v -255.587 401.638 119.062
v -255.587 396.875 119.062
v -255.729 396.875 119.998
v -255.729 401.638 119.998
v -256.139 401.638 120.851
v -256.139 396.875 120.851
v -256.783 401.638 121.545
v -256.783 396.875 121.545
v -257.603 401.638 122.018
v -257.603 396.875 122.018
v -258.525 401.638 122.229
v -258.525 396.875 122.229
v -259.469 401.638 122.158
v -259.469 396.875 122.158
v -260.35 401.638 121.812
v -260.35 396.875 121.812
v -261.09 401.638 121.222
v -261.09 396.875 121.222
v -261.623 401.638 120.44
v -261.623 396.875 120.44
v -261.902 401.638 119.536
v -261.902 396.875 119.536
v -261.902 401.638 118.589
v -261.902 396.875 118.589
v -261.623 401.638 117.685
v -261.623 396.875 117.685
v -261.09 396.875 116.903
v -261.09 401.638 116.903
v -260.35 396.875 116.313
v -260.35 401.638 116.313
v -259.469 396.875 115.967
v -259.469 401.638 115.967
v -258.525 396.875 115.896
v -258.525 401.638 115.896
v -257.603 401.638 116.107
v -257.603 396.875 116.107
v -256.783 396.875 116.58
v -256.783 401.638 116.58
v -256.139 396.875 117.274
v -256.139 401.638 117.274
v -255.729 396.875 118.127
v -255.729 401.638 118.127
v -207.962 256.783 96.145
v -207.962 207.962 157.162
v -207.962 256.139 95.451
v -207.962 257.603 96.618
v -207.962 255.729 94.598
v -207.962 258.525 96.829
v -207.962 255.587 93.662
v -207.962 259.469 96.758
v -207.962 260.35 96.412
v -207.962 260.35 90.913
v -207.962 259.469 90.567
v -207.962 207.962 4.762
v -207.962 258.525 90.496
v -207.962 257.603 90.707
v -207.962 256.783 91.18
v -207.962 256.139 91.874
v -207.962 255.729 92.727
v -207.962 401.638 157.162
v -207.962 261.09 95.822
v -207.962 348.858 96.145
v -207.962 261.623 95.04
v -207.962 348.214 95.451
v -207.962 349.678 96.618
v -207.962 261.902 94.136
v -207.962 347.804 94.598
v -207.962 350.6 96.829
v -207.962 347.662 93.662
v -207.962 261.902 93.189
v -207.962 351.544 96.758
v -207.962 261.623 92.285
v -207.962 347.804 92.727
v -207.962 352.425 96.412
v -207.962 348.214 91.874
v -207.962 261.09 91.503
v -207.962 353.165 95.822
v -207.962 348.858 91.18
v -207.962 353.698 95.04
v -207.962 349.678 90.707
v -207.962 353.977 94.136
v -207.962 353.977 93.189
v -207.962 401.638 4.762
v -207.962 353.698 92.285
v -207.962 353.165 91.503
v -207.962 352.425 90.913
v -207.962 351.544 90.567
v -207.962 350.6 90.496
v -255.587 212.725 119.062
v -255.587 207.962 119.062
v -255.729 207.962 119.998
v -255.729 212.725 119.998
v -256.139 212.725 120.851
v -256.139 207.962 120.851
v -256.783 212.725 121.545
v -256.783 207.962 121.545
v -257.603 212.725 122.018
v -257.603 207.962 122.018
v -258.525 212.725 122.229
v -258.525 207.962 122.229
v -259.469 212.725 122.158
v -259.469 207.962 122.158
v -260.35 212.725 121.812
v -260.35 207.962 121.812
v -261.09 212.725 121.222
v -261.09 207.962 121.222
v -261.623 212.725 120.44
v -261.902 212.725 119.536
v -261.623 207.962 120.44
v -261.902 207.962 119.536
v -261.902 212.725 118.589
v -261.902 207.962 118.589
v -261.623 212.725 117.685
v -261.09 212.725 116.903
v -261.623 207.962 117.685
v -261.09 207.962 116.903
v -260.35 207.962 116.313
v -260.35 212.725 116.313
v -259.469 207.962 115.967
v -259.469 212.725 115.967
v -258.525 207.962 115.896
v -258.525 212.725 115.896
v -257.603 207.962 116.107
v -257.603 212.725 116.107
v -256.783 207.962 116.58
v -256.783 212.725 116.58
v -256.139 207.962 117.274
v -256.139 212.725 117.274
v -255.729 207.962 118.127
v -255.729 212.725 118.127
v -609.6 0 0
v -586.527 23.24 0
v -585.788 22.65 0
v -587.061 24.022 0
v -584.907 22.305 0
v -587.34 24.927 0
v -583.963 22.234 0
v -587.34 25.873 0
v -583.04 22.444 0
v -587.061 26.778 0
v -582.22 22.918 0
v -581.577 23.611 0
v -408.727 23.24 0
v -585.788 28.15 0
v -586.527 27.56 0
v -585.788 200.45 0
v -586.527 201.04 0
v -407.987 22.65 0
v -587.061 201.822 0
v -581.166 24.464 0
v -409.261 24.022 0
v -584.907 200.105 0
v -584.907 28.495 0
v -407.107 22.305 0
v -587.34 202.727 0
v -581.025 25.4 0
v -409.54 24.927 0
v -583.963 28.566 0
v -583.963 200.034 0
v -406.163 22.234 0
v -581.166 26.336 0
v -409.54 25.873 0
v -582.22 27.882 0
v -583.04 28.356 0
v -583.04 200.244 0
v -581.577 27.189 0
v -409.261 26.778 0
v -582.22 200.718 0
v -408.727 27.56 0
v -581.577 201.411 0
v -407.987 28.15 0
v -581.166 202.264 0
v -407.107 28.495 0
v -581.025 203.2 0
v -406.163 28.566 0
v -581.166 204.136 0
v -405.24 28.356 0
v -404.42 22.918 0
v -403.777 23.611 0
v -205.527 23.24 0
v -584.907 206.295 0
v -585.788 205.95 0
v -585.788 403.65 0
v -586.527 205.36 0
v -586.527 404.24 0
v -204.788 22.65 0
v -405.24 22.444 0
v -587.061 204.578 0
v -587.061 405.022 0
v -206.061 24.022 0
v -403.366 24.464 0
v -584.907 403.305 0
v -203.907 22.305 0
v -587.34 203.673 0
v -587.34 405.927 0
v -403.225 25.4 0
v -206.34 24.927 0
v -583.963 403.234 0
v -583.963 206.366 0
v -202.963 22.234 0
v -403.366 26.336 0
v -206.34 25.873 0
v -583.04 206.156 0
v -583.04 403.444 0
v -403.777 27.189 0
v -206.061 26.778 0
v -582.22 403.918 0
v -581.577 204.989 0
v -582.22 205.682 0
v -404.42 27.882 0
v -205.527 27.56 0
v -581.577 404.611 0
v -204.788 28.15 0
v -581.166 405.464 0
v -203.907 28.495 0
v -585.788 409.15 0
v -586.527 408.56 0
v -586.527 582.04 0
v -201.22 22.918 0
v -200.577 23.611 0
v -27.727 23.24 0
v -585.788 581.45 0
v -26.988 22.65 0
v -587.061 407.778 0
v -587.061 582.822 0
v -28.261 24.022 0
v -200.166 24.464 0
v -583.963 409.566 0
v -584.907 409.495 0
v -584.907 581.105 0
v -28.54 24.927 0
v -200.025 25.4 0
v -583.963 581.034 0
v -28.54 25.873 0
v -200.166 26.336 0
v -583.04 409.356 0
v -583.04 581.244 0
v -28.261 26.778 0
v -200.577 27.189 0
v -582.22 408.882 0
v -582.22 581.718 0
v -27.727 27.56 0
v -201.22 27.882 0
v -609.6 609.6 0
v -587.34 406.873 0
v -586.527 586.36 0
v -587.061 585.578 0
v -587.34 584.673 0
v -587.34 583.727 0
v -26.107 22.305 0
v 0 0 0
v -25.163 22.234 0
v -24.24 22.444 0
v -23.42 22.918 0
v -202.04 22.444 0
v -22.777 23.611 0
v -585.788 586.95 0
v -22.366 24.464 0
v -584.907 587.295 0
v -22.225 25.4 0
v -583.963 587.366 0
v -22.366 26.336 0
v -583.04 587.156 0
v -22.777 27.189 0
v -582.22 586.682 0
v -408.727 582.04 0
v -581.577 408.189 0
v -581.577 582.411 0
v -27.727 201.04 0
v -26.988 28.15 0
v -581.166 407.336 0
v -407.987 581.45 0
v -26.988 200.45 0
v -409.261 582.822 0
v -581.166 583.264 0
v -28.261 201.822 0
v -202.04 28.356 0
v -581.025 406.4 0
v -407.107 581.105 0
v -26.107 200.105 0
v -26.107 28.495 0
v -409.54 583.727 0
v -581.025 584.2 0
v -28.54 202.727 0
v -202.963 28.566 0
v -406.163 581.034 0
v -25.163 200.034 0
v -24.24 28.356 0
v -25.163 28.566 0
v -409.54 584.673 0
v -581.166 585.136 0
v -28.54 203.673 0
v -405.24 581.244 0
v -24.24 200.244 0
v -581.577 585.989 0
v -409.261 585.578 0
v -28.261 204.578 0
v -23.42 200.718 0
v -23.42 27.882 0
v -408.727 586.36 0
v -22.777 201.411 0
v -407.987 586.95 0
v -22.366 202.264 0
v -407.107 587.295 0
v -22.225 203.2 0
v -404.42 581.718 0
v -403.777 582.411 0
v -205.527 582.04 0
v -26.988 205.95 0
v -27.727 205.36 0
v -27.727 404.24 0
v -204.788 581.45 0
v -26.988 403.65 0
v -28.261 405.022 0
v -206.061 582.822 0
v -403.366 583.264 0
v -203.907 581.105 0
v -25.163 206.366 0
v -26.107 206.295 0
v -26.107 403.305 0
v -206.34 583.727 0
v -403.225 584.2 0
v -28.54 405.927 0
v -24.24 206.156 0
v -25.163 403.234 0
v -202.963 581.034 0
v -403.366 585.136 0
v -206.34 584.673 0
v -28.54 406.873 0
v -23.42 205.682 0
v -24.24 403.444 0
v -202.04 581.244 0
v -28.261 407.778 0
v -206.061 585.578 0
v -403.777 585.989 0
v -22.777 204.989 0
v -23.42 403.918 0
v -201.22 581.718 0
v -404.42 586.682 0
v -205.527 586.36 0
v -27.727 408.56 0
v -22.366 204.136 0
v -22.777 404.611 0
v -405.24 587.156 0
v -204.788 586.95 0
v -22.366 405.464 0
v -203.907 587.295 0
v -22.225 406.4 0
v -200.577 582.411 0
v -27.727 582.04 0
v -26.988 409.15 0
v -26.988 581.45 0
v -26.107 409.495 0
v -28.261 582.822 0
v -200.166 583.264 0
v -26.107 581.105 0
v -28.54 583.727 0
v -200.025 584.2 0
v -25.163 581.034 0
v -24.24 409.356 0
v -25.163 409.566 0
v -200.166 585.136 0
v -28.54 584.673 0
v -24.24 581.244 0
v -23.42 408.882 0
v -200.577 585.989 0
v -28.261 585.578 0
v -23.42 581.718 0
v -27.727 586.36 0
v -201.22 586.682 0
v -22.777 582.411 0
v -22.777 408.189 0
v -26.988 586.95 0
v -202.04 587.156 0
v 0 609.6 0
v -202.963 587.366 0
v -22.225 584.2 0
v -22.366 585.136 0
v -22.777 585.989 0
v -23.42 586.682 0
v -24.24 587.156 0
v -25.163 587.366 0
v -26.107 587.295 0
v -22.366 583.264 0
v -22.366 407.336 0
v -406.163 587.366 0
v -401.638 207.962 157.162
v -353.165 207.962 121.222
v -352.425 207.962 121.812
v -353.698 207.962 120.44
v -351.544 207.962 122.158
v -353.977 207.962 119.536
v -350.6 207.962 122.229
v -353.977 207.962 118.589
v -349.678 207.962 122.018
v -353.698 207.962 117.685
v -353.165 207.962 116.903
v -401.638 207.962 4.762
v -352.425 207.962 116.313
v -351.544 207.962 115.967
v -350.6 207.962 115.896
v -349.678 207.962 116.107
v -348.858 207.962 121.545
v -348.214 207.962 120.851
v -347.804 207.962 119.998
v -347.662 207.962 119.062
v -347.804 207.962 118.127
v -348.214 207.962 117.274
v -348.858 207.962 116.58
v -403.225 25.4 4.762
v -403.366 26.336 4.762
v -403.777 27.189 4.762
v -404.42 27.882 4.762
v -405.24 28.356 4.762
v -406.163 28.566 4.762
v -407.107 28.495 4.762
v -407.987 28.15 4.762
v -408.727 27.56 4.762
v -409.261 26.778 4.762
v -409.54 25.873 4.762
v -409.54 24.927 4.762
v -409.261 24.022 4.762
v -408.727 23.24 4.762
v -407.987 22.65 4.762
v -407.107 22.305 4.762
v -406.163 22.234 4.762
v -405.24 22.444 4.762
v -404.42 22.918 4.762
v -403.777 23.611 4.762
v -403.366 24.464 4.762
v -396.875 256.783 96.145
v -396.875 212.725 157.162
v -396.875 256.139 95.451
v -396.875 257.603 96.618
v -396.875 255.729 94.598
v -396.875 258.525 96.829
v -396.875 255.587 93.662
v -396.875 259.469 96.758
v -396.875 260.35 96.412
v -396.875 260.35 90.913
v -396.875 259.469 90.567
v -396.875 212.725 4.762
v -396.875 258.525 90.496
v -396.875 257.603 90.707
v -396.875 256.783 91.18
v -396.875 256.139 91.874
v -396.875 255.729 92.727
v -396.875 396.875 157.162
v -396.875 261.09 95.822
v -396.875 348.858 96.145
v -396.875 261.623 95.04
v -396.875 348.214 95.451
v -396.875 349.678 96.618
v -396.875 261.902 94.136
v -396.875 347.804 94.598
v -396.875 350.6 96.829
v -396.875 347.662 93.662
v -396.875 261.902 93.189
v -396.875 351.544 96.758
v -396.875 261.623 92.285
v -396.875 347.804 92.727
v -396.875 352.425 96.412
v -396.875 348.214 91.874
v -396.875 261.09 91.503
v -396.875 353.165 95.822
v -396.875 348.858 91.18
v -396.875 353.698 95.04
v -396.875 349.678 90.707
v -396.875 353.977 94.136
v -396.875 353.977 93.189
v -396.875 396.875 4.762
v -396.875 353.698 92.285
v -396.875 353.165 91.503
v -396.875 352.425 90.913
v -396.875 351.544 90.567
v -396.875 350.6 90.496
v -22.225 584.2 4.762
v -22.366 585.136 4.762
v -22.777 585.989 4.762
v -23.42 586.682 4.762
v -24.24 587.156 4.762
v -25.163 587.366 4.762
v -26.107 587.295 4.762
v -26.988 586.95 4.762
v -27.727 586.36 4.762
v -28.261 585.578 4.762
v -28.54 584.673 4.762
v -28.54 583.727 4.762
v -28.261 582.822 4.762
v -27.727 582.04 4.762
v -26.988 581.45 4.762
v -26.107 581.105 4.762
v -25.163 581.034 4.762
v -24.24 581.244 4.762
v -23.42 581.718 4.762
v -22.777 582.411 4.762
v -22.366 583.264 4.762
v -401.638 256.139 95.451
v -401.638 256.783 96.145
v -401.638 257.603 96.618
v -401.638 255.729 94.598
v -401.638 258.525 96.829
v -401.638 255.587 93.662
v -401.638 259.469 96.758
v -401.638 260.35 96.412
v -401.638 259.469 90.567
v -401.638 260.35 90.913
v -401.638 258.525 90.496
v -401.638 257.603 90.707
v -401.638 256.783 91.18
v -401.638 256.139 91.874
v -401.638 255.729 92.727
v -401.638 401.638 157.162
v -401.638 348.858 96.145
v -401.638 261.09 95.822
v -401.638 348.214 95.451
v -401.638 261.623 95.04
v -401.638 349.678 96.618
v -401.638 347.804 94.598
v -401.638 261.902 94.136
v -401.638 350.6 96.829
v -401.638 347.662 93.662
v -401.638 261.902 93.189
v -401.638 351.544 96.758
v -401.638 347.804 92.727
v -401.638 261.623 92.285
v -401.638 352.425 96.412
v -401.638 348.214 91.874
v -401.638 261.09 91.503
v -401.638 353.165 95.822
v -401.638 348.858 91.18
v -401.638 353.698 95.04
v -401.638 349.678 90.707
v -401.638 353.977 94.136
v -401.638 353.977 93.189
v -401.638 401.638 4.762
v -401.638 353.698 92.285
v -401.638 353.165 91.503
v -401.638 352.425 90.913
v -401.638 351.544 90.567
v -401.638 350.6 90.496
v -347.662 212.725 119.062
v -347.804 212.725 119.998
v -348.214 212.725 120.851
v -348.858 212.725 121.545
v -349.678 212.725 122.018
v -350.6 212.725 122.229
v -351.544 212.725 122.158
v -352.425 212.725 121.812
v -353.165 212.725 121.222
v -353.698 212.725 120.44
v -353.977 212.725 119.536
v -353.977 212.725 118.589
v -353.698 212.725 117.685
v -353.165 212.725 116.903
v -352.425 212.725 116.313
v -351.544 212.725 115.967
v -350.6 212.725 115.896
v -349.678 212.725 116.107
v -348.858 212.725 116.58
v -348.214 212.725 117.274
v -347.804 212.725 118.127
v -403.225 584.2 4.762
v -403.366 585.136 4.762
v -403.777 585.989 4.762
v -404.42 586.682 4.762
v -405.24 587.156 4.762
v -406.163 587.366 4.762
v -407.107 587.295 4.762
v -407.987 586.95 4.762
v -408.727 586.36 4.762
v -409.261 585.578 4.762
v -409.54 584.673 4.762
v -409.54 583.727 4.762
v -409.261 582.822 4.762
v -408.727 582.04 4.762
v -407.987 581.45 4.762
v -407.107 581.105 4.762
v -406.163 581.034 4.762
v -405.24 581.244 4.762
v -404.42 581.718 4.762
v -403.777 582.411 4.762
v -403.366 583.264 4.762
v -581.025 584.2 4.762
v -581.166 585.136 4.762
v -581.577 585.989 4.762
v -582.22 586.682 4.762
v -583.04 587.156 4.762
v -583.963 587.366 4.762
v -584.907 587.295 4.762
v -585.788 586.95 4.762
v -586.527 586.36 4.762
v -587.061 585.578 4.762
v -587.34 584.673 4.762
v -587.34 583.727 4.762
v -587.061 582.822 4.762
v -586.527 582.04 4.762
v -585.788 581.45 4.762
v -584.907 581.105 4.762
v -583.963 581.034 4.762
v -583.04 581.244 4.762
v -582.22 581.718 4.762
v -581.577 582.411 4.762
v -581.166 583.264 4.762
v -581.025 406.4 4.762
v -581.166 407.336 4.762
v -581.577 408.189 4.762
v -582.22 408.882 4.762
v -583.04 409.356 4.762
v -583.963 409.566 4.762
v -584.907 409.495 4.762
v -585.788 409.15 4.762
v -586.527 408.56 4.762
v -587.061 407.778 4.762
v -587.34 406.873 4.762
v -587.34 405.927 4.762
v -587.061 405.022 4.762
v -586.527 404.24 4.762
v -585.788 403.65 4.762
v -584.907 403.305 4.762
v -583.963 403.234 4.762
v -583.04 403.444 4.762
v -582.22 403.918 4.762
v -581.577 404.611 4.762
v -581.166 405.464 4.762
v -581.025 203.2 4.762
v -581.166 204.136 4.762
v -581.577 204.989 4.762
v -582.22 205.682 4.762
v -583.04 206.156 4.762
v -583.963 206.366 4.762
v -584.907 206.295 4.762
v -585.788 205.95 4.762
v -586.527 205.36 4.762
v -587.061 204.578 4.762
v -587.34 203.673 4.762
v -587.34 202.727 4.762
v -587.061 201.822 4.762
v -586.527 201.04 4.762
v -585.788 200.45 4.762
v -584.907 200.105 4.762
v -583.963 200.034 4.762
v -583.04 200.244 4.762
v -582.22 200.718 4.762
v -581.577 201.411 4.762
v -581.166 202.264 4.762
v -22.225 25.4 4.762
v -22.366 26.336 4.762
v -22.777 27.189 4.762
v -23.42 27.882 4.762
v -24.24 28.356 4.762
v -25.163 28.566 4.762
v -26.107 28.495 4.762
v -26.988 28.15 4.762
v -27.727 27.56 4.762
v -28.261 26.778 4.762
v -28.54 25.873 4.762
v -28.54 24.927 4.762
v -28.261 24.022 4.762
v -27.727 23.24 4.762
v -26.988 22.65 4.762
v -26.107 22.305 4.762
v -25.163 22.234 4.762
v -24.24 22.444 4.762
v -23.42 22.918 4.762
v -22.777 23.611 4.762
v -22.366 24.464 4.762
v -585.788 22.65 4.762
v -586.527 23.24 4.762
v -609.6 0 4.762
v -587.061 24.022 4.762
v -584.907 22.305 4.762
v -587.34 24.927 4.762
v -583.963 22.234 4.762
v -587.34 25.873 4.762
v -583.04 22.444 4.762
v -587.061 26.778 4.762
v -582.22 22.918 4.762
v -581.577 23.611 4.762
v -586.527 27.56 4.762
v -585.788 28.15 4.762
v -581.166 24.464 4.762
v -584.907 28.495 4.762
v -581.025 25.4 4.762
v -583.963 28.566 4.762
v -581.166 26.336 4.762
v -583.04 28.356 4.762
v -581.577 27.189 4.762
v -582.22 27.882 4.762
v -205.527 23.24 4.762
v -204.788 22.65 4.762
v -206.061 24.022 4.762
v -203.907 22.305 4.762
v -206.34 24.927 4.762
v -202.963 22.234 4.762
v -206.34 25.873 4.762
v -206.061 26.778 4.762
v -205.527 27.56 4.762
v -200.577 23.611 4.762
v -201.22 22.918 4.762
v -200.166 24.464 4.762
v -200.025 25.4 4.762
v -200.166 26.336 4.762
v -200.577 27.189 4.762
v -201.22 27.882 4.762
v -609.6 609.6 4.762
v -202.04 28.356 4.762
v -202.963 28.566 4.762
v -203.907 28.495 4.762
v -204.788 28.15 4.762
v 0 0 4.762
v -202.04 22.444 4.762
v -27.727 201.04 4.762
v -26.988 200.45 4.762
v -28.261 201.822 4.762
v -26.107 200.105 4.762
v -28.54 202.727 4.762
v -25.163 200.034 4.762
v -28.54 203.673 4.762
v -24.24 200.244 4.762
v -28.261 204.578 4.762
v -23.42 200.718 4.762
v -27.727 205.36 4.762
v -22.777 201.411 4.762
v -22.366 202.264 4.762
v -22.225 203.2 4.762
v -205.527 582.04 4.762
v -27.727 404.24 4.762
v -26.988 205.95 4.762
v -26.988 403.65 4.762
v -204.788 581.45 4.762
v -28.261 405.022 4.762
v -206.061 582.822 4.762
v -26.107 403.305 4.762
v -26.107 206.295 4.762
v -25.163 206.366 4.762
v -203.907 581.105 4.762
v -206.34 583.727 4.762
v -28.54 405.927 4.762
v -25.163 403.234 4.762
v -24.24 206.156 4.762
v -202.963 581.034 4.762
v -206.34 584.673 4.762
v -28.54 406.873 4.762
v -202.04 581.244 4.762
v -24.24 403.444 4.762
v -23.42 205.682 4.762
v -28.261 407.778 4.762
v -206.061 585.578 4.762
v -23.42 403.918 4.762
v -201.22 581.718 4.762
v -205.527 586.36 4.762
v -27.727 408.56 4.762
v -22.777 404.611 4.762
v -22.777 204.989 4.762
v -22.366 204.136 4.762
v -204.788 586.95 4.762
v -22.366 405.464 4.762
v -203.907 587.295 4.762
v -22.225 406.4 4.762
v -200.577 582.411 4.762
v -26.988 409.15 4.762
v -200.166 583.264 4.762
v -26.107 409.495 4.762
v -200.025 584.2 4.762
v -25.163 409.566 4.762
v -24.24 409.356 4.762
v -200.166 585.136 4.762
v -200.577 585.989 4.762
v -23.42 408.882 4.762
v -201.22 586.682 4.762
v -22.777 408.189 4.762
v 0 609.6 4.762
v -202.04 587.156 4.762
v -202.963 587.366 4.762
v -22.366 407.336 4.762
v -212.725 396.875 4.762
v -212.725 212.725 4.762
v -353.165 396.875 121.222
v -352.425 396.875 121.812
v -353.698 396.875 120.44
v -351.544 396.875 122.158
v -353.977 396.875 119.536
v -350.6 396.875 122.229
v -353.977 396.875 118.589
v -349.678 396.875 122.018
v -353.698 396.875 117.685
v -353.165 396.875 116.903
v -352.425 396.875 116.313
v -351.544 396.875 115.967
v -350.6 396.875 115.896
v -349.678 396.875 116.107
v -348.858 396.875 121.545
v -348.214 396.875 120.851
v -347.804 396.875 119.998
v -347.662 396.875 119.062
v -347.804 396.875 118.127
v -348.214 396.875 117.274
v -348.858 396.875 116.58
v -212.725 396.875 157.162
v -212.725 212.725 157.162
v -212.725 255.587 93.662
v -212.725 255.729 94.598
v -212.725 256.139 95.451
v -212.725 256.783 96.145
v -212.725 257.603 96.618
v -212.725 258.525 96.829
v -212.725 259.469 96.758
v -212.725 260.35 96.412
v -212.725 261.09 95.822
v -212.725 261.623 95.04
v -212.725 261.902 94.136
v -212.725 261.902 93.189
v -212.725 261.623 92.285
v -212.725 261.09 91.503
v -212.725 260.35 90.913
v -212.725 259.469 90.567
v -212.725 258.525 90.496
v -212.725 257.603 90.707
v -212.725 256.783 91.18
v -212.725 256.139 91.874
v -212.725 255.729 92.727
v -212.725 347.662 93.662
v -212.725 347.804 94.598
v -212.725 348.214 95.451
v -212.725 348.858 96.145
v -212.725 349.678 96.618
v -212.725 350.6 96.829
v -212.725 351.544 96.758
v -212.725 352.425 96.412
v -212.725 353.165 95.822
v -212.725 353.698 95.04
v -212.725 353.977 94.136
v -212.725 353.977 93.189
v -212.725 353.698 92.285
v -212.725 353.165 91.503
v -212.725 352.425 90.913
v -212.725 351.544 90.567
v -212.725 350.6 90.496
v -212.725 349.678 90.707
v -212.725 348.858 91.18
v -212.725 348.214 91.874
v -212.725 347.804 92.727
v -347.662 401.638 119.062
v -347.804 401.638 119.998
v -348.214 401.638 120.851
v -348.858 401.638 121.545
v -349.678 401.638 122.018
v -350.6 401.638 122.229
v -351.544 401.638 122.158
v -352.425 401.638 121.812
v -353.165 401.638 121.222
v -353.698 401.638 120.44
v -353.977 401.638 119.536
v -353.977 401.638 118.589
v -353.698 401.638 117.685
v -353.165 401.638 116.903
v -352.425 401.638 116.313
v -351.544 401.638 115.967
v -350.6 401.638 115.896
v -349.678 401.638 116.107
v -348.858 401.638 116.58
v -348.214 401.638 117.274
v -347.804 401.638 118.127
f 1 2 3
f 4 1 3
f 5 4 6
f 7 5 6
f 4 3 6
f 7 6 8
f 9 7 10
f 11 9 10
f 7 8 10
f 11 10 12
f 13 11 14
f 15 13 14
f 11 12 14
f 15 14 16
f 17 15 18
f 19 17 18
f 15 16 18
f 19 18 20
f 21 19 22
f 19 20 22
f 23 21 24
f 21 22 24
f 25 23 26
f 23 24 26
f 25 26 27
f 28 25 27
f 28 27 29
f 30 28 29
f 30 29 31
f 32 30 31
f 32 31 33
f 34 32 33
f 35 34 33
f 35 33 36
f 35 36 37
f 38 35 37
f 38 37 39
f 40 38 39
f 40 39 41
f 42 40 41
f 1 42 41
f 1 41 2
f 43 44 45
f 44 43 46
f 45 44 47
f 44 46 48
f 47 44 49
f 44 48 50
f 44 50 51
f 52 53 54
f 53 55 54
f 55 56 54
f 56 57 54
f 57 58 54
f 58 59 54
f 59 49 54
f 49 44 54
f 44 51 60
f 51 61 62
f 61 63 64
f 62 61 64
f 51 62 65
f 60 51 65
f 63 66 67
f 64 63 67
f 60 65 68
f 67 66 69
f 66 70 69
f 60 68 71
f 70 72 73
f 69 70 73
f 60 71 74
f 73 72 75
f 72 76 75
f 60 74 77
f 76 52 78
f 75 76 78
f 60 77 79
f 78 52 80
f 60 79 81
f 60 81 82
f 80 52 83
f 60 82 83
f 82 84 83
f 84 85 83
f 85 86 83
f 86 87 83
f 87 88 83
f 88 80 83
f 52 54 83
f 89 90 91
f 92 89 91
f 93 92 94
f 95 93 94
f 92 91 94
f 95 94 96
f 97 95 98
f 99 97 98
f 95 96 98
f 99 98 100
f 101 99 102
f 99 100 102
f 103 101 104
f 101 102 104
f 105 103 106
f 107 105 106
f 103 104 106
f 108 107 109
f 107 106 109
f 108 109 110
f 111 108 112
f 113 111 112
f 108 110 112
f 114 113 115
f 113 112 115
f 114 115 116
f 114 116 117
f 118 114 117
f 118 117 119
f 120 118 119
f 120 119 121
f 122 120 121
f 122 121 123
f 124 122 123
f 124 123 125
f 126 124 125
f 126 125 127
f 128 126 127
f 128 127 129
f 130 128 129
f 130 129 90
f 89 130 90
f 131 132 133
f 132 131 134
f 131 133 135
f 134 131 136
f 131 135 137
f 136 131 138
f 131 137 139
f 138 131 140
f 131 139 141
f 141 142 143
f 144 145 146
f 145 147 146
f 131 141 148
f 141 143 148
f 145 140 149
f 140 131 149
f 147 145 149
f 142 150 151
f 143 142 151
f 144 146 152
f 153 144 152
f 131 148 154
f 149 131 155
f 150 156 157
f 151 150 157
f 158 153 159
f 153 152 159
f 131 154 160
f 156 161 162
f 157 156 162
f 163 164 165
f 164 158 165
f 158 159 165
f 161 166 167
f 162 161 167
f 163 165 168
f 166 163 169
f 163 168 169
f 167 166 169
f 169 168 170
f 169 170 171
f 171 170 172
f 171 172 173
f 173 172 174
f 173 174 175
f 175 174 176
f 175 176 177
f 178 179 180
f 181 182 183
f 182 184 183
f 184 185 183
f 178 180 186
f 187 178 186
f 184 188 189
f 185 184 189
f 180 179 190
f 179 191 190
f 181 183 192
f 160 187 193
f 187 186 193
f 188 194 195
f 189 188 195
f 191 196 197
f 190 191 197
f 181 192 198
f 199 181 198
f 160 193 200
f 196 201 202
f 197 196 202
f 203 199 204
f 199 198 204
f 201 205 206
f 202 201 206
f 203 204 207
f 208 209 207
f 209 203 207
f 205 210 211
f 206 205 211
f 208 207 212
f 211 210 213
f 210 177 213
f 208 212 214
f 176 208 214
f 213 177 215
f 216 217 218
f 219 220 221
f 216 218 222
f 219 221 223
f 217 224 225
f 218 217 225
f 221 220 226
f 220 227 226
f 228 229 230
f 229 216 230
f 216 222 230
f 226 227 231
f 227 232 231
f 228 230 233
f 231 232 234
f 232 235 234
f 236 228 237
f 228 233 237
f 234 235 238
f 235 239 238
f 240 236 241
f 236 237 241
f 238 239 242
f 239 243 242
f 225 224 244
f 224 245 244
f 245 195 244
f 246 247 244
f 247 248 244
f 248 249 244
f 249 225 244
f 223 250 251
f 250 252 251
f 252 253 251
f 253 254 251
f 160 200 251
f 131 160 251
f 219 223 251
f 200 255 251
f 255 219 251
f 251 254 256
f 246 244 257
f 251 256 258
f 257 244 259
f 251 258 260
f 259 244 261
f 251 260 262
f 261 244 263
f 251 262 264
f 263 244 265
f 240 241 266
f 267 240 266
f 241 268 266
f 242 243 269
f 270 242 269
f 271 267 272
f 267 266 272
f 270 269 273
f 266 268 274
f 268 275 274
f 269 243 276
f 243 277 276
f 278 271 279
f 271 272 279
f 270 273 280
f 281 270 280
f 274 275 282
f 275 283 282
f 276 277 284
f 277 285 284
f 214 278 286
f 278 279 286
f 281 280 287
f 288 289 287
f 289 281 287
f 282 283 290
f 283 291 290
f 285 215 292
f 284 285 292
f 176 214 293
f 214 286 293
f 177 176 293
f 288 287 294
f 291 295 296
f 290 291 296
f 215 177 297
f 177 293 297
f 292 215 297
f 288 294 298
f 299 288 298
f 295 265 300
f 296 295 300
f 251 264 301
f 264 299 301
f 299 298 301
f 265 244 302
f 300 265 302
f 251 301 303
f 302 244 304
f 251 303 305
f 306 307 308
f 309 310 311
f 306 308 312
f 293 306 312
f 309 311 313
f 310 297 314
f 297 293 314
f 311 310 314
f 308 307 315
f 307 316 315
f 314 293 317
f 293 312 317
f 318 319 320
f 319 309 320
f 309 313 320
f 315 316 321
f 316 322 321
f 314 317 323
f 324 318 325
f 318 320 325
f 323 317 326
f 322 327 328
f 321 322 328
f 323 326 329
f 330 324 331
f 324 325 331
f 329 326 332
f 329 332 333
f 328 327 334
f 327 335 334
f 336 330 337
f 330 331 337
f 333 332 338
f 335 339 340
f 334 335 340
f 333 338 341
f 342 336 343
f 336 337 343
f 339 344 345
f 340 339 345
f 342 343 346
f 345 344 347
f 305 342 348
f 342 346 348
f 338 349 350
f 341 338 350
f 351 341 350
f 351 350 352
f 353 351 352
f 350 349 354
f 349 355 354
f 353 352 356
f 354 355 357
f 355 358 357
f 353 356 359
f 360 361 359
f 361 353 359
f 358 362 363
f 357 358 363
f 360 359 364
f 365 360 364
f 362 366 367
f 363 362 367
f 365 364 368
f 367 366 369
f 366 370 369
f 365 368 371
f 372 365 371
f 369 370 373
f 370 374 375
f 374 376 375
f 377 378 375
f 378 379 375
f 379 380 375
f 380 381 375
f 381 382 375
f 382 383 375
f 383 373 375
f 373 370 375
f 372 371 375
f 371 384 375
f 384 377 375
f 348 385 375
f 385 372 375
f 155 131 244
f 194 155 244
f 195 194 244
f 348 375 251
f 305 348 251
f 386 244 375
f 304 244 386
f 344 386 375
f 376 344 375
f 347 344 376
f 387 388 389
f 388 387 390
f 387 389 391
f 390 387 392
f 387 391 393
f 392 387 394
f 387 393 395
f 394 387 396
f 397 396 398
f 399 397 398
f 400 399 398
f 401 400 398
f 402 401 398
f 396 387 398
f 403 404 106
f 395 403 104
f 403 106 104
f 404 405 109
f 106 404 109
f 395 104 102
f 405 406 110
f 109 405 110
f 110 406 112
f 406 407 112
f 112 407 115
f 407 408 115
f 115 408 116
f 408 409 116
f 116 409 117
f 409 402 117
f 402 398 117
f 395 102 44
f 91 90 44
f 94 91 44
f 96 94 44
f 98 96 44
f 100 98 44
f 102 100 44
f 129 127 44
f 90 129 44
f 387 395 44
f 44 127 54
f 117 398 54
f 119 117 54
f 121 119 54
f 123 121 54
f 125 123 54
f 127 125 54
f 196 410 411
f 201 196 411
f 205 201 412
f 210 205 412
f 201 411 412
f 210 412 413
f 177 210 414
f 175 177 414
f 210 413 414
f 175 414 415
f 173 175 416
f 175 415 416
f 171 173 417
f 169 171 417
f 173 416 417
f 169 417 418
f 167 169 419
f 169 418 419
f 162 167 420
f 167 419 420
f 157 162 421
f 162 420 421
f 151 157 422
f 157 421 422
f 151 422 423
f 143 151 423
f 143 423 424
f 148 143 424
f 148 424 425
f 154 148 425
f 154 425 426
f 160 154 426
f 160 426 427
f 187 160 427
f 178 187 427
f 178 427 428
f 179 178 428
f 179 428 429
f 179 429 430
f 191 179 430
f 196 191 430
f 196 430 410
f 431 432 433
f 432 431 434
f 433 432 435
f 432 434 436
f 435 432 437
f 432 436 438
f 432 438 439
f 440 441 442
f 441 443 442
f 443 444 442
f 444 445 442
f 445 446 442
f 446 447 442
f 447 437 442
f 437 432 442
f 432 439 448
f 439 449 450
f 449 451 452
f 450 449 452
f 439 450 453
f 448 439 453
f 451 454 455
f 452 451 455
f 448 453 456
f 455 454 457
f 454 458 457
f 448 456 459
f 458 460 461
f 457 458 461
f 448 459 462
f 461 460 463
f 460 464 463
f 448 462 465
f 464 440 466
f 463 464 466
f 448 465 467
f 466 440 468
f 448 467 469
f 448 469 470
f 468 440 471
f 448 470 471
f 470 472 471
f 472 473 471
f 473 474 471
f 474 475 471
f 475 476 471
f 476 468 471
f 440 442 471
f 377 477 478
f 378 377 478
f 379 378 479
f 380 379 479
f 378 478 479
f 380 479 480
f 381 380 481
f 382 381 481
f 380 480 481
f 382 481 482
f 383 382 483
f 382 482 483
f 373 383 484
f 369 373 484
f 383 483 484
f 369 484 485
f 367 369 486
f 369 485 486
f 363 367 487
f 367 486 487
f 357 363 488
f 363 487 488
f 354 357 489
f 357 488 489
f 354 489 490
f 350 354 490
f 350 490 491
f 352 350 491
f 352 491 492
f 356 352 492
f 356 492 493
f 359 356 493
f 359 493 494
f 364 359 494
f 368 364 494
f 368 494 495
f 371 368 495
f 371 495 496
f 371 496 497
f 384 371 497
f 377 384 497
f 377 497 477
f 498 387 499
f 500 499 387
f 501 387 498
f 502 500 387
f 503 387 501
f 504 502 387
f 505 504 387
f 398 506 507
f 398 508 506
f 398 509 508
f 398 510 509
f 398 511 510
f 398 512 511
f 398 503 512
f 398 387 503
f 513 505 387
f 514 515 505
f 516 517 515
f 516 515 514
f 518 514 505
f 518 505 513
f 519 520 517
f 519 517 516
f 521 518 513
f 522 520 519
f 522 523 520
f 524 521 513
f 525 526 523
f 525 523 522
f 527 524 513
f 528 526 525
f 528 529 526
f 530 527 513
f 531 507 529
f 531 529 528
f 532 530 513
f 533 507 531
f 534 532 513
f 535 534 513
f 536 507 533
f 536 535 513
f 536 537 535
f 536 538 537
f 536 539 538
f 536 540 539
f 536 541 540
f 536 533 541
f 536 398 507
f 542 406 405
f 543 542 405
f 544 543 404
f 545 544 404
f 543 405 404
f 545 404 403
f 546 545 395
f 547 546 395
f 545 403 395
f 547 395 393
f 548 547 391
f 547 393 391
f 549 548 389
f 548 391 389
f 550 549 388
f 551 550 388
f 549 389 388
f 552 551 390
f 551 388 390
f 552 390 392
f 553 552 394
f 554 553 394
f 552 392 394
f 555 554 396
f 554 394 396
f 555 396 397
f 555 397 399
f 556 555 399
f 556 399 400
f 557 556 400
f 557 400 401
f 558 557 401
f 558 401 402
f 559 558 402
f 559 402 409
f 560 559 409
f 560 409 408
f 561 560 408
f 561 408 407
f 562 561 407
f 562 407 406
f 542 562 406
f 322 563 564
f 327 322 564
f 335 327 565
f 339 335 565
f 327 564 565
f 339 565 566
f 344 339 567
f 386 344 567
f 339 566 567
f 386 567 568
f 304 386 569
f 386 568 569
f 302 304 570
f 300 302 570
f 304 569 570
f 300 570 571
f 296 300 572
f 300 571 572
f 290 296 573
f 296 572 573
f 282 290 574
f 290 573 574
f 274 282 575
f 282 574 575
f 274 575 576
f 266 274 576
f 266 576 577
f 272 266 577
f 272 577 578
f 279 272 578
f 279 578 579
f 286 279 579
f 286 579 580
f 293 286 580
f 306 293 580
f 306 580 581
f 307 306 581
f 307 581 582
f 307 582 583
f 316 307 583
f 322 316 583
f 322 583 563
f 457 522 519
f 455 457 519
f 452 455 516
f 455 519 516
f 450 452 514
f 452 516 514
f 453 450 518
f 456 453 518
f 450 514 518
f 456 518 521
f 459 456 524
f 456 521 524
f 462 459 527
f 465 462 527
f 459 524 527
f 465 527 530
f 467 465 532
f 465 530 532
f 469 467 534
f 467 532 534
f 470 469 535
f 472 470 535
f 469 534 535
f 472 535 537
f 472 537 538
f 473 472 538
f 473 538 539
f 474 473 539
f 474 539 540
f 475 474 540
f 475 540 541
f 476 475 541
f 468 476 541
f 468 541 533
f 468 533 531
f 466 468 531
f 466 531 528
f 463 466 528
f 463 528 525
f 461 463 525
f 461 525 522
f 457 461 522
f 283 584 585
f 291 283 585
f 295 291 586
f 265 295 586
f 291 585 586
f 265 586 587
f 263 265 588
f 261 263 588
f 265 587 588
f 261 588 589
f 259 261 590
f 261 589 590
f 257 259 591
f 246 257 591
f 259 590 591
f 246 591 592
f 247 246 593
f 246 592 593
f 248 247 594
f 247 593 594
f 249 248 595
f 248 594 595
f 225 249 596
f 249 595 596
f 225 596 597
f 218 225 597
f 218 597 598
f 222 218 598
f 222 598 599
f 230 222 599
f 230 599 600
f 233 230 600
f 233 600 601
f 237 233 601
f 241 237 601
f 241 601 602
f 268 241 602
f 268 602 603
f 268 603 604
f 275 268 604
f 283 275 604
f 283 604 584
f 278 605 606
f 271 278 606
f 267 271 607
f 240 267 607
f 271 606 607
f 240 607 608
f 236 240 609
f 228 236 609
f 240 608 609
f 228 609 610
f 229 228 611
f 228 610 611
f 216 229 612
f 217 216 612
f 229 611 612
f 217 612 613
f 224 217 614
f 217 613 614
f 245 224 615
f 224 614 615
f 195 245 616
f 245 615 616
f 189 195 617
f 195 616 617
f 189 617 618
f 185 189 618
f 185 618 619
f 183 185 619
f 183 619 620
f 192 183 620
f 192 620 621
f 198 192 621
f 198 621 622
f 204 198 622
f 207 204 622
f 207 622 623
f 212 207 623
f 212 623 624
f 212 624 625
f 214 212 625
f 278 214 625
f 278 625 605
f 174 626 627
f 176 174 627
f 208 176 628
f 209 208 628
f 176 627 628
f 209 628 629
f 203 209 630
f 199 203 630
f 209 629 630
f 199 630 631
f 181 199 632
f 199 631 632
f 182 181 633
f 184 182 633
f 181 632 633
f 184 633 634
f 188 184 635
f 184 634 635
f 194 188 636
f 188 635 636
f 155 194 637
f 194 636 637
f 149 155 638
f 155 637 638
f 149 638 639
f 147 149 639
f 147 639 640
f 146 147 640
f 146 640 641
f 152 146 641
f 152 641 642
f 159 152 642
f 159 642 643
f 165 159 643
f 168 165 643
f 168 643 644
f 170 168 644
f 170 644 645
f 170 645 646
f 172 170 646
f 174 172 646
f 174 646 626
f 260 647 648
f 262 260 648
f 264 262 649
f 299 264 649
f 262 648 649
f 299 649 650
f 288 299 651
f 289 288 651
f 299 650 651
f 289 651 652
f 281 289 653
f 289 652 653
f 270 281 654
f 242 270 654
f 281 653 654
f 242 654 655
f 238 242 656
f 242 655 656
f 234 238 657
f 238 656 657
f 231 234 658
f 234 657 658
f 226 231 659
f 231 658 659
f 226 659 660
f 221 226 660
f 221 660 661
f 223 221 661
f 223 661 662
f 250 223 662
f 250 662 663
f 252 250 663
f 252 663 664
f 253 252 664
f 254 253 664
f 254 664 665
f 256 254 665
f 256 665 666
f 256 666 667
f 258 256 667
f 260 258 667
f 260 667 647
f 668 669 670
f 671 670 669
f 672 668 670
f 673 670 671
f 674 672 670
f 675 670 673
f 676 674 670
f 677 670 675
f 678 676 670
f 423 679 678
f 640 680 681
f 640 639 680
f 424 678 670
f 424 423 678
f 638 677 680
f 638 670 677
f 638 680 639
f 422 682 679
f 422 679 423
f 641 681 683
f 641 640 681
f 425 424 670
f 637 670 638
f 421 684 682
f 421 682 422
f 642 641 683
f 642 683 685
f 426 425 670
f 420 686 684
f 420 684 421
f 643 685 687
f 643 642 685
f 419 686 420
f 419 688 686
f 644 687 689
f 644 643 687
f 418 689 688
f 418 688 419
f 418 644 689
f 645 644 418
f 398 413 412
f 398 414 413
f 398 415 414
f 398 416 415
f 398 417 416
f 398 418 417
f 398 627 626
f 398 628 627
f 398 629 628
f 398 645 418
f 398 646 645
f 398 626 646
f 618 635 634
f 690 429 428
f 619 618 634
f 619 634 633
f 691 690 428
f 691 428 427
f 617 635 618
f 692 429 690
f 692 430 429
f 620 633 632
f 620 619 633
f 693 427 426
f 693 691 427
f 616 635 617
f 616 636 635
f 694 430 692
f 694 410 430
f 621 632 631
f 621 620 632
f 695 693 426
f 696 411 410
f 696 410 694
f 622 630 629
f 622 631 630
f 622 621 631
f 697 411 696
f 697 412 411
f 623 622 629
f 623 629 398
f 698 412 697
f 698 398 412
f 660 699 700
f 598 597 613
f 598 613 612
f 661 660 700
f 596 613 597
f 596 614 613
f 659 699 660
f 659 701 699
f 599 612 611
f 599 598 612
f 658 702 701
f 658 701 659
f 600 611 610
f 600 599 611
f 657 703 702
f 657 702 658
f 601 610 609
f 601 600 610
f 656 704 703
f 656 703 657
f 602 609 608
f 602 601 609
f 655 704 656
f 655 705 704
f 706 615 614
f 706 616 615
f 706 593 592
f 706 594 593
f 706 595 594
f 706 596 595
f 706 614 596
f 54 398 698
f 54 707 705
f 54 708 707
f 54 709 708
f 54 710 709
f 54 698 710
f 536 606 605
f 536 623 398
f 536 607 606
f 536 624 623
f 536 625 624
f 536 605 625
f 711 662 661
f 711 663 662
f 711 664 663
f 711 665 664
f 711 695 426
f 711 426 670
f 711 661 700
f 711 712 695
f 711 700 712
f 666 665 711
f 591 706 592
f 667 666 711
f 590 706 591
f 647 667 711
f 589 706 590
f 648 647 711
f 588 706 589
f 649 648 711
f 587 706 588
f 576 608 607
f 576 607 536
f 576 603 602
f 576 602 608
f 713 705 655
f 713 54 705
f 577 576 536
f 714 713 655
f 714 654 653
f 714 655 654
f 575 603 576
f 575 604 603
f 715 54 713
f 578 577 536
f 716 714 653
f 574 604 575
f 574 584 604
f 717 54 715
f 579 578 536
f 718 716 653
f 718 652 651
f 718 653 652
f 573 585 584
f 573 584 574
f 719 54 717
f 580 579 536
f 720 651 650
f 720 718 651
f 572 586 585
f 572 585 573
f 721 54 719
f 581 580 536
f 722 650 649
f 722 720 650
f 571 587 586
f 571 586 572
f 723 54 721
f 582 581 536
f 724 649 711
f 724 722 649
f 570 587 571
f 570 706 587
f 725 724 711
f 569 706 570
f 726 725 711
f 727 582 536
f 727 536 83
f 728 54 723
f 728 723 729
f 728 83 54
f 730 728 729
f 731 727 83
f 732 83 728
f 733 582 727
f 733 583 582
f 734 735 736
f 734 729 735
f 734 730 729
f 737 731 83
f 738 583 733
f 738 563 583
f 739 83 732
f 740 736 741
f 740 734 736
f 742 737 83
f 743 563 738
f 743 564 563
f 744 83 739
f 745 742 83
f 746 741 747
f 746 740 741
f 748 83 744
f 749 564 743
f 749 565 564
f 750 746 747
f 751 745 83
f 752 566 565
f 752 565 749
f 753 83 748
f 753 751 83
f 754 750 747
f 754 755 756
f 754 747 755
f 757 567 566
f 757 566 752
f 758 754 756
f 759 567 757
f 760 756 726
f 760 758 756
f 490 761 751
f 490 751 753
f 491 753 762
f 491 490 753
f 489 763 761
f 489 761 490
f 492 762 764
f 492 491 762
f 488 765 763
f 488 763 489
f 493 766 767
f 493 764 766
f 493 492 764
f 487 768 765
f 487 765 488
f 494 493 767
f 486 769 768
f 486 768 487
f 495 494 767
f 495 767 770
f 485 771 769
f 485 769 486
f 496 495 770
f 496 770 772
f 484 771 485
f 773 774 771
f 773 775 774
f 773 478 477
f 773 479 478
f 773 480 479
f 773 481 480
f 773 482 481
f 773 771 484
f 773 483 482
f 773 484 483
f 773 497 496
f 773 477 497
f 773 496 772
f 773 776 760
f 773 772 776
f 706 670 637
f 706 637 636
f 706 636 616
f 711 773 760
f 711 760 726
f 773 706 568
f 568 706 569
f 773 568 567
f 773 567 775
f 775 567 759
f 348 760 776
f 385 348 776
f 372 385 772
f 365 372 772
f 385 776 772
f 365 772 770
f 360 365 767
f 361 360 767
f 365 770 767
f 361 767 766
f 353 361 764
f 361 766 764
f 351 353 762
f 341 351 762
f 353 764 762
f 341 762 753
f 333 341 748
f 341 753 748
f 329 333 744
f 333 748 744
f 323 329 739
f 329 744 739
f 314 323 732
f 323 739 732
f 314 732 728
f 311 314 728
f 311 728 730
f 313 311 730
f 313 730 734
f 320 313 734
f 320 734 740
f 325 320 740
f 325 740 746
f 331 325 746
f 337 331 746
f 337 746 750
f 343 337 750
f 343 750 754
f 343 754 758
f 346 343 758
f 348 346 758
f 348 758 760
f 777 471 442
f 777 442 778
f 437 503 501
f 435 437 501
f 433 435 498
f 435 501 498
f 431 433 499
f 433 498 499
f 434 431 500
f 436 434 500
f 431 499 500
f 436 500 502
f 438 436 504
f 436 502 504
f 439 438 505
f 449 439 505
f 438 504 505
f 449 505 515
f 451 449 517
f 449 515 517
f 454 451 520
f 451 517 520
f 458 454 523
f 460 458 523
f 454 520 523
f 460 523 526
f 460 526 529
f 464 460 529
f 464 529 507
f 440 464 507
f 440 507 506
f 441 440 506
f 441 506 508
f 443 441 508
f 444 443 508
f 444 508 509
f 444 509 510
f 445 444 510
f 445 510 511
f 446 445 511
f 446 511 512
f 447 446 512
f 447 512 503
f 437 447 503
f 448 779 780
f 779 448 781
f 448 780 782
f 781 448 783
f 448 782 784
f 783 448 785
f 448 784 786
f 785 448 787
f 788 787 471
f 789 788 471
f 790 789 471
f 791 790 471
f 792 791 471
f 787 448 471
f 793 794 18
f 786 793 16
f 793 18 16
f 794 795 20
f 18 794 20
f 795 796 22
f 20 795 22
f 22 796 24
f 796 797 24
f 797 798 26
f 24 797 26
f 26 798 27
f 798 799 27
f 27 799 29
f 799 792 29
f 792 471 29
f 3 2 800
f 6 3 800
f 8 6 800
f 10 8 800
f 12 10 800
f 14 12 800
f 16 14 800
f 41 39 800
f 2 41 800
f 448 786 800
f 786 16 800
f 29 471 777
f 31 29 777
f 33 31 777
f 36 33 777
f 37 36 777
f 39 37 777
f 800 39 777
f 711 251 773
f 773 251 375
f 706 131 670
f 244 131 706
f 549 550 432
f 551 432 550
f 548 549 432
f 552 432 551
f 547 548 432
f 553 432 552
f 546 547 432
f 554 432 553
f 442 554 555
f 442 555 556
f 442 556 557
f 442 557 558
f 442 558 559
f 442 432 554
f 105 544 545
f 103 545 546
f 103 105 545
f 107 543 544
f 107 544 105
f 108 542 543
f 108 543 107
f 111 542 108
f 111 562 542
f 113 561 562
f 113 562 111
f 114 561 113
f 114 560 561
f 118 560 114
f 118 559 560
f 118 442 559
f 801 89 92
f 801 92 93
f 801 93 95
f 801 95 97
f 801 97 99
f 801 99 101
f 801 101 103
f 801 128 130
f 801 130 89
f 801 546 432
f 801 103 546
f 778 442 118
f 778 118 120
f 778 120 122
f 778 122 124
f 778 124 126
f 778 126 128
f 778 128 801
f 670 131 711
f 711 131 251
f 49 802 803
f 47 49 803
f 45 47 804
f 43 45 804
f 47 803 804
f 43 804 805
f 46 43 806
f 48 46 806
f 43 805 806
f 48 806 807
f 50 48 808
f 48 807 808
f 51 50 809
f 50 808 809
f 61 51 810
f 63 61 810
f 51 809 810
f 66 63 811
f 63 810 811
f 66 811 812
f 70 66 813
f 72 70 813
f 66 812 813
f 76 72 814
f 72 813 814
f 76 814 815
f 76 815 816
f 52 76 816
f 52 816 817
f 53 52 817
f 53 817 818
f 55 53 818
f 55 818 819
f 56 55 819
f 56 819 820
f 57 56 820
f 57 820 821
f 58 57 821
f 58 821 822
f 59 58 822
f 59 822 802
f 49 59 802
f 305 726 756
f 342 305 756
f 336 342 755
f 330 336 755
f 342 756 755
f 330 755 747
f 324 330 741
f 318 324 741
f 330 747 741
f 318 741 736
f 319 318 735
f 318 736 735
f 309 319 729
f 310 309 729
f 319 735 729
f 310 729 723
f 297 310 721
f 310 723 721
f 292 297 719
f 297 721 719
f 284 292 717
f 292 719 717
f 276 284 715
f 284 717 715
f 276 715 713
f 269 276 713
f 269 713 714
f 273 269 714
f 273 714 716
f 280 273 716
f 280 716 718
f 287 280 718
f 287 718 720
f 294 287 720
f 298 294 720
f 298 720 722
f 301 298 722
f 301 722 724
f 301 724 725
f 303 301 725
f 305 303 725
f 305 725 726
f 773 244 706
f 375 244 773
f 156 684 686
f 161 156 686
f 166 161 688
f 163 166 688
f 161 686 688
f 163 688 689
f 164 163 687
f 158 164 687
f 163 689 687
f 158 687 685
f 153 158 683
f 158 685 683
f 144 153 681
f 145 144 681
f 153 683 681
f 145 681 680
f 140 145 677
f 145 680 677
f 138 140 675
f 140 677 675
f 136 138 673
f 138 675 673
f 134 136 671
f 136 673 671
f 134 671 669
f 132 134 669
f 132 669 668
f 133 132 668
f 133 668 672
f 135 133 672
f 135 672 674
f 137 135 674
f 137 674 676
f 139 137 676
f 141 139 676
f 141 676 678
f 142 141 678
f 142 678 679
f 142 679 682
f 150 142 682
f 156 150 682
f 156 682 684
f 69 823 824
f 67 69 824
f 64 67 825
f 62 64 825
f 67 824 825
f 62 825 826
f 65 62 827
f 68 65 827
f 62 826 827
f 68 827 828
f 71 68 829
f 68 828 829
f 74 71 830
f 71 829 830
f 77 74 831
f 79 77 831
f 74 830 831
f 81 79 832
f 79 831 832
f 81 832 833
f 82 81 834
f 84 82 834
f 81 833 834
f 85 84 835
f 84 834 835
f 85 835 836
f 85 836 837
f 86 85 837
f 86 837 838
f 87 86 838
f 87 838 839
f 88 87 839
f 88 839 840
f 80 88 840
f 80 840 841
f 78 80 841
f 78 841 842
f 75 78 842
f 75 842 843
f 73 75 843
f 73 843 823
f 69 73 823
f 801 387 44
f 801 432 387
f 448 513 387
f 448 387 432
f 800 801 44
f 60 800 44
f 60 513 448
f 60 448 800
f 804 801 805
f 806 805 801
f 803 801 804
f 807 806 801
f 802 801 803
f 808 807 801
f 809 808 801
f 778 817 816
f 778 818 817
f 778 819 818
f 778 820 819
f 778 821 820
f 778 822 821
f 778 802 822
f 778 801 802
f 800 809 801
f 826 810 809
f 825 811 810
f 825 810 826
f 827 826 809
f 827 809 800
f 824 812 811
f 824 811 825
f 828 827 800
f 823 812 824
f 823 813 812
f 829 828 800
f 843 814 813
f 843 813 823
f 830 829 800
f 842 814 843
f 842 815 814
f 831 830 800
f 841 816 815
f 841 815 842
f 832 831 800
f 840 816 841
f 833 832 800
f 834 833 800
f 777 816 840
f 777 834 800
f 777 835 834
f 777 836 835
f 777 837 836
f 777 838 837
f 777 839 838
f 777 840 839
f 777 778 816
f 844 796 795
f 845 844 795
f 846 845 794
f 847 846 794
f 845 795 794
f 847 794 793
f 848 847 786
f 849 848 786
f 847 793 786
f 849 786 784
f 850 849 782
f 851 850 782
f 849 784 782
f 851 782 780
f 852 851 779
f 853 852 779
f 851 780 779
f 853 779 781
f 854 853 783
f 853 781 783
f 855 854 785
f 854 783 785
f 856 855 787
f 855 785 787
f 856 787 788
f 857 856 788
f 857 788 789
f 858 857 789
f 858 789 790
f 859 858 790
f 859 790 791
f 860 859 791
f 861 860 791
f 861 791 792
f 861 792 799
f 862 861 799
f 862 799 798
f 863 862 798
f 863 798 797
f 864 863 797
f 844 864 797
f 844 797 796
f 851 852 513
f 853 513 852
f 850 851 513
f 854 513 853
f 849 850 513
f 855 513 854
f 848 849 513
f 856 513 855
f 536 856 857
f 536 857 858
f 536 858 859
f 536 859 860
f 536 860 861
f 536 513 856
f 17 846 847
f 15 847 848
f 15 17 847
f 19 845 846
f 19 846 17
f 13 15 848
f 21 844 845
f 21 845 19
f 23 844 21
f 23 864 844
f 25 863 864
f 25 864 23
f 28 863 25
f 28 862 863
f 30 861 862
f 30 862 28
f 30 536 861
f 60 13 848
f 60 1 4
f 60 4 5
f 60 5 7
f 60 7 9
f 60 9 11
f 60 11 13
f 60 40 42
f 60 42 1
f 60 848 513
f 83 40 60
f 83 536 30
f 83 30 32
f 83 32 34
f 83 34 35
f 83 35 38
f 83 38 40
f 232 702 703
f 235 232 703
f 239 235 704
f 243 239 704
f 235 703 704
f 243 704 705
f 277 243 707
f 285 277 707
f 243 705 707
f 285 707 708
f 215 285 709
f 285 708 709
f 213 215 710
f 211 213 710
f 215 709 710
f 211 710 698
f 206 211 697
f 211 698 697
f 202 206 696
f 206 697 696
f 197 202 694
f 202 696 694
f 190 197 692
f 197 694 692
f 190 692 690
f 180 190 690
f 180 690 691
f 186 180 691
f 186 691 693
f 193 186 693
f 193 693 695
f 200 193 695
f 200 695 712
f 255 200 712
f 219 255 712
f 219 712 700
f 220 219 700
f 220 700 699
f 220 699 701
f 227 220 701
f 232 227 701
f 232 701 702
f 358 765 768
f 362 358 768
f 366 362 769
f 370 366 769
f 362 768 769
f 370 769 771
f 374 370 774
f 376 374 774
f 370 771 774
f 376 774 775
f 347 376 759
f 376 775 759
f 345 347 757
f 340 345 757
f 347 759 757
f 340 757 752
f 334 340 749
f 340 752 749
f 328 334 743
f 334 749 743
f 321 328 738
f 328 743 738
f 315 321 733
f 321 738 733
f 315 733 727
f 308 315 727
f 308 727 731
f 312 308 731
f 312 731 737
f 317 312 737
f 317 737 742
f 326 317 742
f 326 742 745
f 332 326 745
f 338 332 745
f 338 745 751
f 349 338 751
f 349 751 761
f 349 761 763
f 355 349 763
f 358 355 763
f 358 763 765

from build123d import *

# Parameters (mm, degrees)
F0_W     = 609.6
F0_H     = 609.6
F1_DEPTH = 4.7625
F2_W     = 193.675
F2_H     = 193.675
F2_W_2   = 184.15
F2_H_2   = 184.15
F3_DEPTH = 152.4
F4_R     = 3.175
F5_DEPTH = 25.4
F6_R     = 3.175
F7_DEPTH = 401.6385
F8_R     = 3.175
F9_DEPTH = 401.6385


with BuildPart() as f1:
    # F0 (on Top) → F1 (new body)
    with BuildSketch(Plane.XY):
        with Locations((-304.8, 304.8)):
            Rectangle(F0_W, F0_H)
    extrude(amount=F1_DEPTH)

    # F2 (on face) → F3 (join)
    with BuildSketch(Plane.XY.offset(4.7625)):
        with Locations((-304.8, 304.8)):
            Rectangle(F2_W, F2_H)
        with Locations((-304.8, 304.8)):
            Rectangle(F2_W_2, F2_H_2, mode=Mode.SUBTRACT)
    extrude(amount=F3_DEPTH)

    # F4 (on face) → F5 (cut)
    with BuildSketch(Plane.XY.offset(4.7625)):
        with Locations((-25.4, 584.2)):
            Circle(F4_R)
        with Locations((-25.4, 25.4)):
            Circle(F4_R)
        with Locations((-584.2, 584.2)):
            Circle(F4_R)
        with Locations((-584.2, 25.4)):
            Circle(F4_R)
        with Locations((-25.4, 406.4)):
            Circle(F4_R)
        with Locations((-25.4, 203.2)):
            Circle(F4_R)
        with Locations((-584.2, 406.4)):
            Circle(F4_R)
        with Locations((-584.2, 203.2)):
            Circle(F4_R)
        with Locations((-406.4, 25.4)):
            Circle(F4_R)
        with Locations((-406.4, 584.2)):
            Circle(F4_R)
        with Locations((-203.2, 25.4)):
            Circle(F4_R)
        with Locations((-203.2, 584.2)):
            Circle(F4_R)
    extrude(amount=-F5_DEPTH, mode=Mode.SUBTRACT)

    # F6 (on face) → F7 (cut, through all)
    with BuildSketch(Plane.XZ.offset(-207.9625)):
        with Locations((-350.8375, 119.0625)):
            Circle(F6_R)
        with Locations((-258.7625, 119.0625)):
            Circle(F6_R)
    extrude(amount=-F7_DEPTH, mode=Mode.SUBTRACT)

    # F8 (on face) → F9 (cut, through all)
    with BuildSketch(Plane(origin=(-401.6375, 0, 0), x_dir=(0, -1, 0), z_dir=(-1, 0, 0))):
        with Locations((-258.7625, 93.6625)):
            Circle(F8_R)
        with Locations((-350.8375, 93.6625)):
            Circle(F8_R)
    extrude(amount=-F9_DEPTH, mode=Mode.SUBTRACT)


solid = f1.part
